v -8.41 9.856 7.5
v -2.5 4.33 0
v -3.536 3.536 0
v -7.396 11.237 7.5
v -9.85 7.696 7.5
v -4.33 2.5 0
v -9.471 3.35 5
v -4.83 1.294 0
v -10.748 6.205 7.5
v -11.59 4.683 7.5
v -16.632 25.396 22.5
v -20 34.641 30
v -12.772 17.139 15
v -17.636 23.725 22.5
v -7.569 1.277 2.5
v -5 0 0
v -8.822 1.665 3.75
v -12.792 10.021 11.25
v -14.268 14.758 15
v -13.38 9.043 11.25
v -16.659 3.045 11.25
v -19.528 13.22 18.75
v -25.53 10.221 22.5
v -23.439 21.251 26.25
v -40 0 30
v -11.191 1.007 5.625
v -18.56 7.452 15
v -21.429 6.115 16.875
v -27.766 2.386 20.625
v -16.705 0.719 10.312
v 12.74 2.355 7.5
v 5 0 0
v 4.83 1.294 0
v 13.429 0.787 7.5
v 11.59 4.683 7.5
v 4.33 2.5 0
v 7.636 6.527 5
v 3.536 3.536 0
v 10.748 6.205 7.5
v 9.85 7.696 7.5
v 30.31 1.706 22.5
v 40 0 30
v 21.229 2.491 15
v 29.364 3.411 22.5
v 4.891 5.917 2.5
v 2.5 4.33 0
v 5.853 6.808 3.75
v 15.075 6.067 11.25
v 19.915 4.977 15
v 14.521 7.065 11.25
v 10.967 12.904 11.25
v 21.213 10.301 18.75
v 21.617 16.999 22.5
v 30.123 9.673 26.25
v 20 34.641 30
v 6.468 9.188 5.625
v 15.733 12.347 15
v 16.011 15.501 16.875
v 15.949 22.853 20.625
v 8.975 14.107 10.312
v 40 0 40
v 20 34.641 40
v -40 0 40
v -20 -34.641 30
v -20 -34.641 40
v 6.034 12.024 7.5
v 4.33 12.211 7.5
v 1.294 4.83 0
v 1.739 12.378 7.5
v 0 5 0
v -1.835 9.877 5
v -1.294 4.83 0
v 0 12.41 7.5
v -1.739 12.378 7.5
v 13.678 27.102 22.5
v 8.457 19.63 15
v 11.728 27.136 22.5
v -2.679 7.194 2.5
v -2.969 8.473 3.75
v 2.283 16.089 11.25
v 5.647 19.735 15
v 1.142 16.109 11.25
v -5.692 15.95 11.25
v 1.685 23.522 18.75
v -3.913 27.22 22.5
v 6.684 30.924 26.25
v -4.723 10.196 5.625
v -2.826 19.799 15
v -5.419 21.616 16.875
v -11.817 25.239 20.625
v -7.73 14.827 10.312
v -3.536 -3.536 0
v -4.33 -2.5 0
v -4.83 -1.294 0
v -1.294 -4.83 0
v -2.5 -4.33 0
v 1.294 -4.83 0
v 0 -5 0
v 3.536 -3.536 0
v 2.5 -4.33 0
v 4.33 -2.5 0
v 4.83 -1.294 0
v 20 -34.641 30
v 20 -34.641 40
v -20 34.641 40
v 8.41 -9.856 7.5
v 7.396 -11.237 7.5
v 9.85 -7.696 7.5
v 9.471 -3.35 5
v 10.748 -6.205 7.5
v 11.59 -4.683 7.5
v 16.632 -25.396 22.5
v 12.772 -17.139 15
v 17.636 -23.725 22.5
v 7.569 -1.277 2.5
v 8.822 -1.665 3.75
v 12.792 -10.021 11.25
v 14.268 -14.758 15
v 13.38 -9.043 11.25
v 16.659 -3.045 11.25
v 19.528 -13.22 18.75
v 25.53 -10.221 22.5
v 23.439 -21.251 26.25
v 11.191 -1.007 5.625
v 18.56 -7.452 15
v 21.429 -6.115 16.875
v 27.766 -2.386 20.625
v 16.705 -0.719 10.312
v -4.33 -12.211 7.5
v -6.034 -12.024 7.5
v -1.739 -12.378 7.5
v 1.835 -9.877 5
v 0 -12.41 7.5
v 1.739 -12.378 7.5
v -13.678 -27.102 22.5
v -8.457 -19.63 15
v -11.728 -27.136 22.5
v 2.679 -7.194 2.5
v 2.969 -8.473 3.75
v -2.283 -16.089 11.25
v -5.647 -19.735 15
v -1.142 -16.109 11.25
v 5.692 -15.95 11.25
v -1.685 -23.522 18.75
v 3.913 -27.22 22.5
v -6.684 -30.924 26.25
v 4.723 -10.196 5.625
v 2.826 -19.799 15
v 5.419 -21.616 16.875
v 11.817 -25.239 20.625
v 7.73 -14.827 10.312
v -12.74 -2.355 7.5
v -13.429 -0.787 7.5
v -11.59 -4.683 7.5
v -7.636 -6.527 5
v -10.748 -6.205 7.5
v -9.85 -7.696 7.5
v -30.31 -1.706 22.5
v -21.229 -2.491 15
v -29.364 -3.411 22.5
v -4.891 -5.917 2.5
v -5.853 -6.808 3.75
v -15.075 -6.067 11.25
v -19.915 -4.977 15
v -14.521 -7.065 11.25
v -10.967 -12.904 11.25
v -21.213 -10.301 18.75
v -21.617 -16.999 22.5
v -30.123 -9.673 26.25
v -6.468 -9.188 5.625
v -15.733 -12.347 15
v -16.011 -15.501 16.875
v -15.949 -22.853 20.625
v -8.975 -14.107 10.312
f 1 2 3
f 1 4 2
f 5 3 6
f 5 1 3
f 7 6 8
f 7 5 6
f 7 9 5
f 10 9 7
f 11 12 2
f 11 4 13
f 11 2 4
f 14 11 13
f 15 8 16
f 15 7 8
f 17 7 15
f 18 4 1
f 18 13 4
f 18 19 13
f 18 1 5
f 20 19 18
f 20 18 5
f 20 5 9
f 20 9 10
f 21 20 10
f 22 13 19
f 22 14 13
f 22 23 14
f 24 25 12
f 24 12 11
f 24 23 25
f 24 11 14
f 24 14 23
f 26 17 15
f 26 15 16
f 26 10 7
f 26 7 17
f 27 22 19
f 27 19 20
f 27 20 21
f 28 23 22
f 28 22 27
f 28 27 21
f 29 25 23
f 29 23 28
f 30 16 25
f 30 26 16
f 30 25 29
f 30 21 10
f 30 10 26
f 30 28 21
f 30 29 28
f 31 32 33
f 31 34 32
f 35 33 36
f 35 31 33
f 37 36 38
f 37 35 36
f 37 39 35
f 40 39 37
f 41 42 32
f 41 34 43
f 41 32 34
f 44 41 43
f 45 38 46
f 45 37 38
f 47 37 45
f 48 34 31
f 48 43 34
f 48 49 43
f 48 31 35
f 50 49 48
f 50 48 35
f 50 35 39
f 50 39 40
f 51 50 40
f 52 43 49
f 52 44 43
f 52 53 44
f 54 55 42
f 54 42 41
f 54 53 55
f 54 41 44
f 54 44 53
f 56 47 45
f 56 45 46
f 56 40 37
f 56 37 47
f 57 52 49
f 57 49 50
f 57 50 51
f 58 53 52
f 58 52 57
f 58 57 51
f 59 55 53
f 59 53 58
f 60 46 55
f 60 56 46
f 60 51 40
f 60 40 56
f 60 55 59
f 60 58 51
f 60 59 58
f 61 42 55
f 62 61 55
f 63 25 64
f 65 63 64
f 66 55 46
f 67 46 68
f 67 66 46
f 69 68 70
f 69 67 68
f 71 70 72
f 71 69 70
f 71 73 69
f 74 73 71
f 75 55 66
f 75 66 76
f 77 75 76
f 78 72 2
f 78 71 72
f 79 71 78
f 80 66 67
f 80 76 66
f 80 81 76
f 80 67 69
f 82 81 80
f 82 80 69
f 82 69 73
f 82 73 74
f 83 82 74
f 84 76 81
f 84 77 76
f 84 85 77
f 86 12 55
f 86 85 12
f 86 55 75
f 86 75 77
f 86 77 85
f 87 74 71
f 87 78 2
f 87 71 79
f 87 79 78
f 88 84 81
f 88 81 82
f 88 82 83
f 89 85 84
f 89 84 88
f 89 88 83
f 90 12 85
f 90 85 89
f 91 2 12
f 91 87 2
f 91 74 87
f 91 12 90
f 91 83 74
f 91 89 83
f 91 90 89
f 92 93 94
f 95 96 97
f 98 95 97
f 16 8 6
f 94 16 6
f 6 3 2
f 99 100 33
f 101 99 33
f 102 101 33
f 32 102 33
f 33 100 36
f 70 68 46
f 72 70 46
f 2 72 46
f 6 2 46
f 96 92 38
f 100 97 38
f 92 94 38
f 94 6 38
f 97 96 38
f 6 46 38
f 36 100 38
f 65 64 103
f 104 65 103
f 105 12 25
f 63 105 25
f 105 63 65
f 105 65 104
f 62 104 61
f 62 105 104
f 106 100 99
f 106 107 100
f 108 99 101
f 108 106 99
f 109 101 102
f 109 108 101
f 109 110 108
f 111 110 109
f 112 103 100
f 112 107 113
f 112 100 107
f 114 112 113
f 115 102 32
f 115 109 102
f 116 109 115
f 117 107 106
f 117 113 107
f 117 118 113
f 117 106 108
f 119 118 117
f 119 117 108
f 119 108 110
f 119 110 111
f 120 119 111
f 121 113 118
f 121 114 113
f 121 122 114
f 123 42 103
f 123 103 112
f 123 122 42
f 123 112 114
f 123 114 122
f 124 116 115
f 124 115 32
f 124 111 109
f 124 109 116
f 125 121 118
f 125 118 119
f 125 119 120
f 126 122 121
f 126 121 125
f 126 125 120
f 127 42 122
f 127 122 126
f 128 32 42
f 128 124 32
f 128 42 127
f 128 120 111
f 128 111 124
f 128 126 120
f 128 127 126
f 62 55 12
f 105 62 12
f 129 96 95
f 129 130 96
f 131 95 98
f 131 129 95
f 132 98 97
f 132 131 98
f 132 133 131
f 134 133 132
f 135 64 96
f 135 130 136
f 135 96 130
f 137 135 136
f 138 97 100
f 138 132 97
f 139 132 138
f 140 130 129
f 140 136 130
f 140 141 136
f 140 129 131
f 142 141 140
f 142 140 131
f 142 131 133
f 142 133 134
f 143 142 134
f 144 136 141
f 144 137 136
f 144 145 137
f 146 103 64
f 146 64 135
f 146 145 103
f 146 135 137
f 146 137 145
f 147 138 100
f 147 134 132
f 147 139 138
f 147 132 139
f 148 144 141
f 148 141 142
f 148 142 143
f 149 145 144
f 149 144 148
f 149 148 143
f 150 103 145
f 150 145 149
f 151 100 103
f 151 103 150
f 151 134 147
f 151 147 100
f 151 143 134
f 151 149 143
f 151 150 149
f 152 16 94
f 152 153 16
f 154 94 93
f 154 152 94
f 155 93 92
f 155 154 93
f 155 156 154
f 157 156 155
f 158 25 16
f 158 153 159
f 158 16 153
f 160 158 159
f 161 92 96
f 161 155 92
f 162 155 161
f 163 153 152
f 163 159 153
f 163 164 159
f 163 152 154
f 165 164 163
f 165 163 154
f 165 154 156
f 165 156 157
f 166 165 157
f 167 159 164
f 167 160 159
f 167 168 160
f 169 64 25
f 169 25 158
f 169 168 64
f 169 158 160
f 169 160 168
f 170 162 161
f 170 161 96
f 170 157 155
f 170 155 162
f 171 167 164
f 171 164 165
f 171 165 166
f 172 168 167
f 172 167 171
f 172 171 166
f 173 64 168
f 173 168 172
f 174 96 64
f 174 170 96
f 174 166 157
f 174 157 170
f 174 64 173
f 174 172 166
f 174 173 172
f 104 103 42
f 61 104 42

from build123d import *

# Parameters (mm, degrees)
F1_DEPTH = 40
F3_DEPTH = 30
F5_R     = 5


with BuildPart() as f1:
    # F0 (on Top) → F1 (new body)
    with BuildSketch(Plane.XY):
        Polygon((20, -34.641016), (40, 0), (20, 34.641016), (-20, 34.641016), (-40, 0), (-20, -34.641016), align=None)
    extrude(amount=F1_DEPTH)

    # F2 (on face) → F3 (cut)
    with BuildSketch(Plane(origin=(0, 0, 0), x_dir=(1, 0, 0), z_dir=(0, 0, -1))):
        Polygon((-20, -34.641016), (20, -34.641016), (40, 0), (20, 34.641016), (-20, 34.641016), (-40, 0), align=None)
    extrude(amount=-F3_DEPTH, mode=Mode.SUBTRACT)

    # F5 (on Top) → F6 section 0
    with BuildSketch(Plane.XY):
        Circle(F5_R)
    # F4 (on face) → F6 section 1
    with BuildSketch(Plane(origin=(0, 0, 30), x_dir=(1, 0, 0), z_dir=(0, 0, -1))):
        Polygon((-40, 0), (-20, -34.641016), (20, -34.641016), (40, 0), (20, 34.641016), (-20, 34.641016), align=None)
    loft()


solid = f1.part
